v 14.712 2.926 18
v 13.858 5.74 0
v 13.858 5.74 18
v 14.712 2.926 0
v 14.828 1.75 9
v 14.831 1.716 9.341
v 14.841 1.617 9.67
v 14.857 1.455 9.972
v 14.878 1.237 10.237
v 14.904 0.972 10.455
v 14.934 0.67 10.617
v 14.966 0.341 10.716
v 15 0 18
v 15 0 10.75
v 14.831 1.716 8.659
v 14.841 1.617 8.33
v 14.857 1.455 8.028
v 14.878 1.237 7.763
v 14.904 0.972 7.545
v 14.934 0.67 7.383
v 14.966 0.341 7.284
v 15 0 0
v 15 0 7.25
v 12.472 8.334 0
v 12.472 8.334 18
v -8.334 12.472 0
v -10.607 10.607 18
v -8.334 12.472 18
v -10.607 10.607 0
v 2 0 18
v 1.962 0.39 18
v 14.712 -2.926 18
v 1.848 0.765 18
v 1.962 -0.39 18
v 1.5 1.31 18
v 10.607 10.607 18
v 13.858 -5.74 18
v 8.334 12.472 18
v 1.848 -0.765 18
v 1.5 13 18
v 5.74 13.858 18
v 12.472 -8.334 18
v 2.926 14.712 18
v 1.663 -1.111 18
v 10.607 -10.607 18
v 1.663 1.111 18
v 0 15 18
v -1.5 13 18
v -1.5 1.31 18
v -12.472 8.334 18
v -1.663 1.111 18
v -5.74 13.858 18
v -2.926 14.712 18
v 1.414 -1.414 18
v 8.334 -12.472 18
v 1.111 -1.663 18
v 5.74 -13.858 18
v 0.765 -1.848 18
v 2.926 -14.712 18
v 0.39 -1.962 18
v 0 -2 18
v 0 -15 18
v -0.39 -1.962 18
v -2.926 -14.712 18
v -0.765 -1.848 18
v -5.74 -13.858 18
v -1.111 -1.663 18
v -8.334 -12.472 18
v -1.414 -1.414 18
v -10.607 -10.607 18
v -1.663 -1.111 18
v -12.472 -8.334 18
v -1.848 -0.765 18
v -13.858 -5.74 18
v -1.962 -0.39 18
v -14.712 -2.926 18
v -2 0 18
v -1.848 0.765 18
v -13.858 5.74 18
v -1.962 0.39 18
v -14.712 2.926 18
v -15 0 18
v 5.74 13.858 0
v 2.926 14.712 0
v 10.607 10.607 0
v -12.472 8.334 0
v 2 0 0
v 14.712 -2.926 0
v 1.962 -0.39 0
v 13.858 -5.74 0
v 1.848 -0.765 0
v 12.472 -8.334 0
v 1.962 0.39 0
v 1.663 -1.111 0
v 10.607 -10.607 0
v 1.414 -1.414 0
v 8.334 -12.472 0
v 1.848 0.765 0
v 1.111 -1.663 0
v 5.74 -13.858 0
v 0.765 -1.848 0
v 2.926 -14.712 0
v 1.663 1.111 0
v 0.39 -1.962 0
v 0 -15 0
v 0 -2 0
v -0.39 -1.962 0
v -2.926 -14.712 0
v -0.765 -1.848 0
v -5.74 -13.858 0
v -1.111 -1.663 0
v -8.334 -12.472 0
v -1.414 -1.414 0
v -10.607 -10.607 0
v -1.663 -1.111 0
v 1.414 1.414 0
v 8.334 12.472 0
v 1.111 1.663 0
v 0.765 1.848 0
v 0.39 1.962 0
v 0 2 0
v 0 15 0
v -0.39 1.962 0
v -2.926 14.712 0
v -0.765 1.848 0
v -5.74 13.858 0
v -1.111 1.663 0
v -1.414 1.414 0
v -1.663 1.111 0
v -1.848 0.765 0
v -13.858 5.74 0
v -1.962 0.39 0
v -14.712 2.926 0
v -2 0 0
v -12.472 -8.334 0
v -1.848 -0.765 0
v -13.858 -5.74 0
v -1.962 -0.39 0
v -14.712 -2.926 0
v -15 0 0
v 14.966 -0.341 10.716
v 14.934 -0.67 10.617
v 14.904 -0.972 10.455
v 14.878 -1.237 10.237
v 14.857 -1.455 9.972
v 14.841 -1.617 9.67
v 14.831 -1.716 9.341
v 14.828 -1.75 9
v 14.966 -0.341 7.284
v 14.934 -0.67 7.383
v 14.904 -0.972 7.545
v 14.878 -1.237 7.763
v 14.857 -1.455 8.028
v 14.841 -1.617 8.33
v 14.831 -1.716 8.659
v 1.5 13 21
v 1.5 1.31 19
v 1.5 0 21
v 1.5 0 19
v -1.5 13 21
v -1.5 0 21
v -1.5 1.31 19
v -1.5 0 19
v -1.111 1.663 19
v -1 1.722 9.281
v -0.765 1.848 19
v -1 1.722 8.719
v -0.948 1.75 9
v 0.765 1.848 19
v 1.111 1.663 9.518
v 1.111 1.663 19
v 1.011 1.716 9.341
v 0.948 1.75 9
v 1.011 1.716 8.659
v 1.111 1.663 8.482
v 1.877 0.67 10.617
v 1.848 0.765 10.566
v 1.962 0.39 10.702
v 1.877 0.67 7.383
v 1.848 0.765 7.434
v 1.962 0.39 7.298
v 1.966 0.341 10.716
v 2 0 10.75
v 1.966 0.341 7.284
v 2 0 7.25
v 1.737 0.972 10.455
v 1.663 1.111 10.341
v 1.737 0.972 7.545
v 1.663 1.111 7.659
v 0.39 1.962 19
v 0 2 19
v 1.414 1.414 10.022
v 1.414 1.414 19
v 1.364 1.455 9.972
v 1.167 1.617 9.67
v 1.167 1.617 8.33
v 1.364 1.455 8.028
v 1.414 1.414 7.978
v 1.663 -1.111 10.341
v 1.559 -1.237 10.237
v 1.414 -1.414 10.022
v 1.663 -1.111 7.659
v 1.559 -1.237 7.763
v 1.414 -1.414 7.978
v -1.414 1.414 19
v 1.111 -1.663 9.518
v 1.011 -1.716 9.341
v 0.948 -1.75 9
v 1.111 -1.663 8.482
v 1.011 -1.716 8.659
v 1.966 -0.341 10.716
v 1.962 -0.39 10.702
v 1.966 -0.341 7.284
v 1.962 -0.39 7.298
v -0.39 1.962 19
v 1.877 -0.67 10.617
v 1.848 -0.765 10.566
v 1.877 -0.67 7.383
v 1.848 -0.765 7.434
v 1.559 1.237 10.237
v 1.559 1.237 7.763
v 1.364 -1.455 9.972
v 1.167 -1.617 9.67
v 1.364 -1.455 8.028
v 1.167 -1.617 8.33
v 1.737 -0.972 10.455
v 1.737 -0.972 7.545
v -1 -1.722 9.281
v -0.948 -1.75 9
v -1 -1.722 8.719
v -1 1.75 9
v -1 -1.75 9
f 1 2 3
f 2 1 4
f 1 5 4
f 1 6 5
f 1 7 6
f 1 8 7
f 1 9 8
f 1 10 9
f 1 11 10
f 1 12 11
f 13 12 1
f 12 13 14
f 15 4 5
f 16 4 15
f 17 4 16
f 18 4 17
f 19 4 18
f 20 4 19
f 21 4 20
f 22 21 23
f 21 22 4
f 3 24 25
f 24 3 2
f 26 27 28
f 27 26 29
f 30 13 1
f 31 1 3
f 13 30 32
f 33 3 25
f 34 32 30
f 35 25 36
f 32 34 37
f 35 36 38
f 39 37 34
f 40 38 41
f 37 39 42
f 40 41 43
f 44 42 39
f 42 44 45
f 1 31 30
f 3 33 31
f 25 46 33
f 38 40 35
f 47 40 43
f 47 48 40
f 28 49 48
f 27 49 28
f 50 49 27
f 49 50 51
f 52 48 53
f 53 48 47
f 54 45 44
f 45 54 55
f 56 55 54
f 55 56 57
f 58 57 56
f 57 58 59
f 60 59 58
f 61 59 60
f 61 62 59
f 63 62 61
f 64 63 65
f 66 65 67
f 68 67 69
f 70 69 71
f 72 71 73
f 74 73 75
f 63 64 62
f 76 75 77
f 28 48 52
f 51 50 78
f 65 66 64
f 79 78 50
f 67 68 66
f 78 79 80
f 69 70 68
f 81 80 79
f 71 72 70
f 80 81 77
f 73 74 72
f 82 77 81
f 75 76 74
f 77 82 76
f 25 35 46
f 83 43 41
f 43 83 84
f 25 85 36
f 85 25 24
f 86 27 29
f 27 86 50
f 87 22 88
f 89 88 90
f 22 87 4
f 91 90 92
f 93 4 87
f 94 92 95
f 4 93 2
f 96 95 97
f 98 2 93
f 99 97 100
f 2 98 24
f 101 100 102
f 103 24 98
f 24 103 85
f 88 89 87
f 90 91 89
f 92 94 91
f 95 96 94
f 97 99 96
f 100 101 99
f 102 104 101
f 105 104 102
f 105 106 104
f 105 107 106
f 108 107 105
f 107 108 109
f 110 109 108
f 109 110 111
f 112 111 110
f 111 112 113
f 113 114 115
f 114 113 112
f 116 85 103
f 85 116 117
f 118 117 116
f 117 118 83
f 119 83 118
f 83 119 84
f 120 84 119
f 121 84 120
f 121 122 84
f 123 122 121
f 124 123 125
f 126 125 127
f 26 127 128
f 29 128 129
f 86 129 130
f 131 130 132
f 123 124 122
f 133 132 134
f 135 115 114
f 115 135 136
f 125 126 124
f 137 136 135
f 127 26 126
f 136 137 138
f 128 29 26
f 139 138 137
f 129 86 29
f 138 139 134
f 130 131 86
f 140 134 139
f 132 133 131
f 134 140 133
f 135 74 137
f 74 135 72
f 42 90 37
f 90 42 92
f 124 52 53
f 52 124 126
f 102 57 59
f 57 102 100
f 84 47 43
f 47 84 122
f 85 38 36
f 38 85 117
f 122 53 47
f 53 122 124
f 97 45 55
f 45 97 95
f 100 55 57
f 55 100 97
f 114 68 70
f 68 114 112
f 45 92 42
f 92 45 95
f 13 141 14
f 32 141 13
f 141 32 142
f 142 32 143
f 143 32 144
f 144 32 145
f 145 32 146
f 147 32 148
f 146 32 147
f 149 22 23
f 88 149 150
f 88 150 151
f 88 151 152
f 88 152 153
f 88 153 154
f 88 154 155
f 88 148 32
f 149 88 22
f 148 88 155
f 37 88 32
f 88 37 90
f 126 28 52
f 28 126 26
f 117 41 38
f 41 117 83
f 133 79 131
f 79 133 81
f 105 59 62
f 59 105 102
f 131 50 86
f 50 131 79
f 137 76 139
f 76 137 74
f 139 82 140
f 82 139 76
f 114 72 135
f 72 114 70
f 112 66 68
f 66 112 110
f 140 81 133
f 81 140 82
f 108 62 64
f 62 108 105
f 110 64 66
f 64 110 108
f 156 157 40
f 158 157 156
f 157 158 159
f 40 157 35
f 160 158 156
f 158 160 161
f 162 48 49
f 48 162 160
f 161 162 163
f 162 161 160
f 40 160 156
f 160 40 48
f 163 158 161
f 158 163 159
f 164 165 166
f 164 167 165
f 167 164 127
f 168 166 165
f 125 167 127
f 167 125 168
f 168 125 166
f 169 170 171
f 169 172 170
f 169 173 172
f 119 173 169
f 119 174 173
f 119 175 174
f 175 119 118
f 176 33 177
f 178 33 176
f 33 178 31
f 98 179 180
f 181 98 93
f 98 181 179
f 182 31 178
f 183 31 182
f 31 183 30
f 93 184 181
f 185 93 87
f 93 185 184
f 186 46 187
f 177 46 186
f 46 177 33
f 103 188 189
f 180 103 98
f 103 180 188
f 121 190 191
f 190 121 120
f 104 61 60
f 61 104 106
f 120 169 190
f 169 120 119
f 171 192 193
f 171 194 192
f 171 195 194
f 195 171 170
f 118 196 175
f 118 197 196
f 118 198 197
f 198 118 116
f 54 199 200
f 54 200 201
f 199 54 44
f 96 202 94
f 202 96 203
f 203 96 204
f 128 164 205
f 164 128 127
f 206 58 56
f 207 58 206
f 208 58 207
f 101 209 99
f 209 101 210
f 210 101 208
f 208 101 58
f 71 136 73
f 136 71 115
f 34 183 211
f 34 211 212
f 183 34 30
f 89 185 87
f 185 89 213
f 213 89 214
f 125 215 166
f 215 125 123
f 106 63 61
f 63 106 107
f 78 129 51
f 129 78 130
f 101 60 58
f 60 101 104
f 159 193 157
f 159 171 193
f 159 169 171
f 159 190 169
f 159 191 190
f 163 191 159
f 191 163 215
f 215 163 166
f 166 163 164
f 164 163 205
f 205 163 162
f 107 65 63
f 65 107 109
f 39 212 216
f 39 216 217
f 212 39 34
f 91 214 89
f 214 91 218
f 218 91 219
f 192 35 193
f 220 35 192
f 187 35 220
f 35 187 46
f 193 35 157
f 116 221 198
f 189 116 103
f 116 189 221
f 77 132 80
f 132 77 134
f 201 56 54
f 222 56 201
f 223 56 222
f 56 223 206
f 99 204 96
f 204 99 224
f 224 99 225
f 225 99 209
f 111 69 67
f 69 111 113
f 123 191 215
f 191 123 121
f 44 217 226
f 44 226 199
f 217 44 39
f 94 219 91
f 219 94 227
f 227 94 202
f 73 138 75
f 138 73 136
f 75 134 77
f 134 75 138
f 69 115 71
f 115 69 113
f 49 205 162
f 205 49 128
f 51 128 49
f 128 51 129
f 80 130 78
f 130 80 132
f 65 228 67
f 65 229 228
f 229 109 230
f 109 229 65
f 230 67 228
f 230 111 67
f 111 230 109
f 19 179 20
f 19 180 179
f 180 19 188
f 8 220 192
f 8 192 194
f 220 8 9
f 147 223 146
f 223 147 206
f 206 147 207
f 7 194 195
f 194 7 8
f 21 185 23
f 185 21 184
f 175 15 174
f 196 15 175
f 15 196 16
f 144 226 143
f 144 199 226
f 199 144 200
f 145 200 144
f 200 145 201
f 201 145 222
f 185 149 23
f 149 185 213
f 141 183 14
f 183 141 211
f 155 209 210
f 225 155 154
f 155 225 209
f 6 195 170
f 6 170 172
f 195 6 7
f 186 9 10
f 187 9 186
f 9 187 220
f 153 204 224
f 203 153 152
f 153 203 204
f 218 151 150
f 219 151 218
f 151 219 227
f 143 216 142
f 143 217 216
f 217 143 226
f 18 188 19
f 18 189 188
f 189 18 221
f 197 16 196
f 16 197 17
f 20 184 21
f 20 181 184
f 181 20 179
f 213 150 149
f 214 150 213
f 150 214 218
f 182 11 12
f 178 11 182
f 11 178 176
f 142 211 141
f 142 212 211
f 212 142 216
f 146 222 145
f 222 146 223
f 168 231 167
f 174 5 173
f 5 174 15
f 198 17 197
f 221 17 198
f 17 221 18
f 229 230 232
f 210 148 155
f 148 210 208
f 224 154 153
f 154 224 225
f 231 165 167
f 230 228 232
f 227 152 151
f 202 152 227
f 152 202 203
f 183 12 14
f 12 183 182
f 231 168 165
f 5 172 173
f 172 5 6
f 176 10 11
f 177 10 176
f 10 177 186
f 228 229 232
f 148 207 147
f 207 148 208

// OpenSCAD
$fn = 32;

// ----------------------------------------------------------------------
// Control knob: pointer knob
// ----------------------------------------------------------------------

// --- parameters (mm) ---
rib_w = 3;                // pointer rib width
rib_h = 4;                // pointer rib height
knob_d = 30;              // knob body diameter
knob_h = 18;              // knob body height
bore_d = 4;               // shaft bore diameter
set_d = 3.5;              // set screw bore diameter
fit_tol = 0.05;           // tolerance for press fits, mm
free_tol = 0.3;           // tolerance for clearance fits, mm

rib_poke = rib_h - 1;  // rib height above the top
total_h = knob_h + rib_h - 1;  // overall height

difference() {
  union() {
    cylinder(h = knob_h, d = knob_d);
    translate([-rib_w / 2, 0, knob_h - 1])
      cube([rib_w, knob_d / 2 - 2, rib_h]);
  }
  translate([0, 0, -1]) cylinder(h = knob_h + 2, d = bore_d);
  translate([-1, 0, knob_h / 2]) rotate([0, 90, 0])
    cylinder(h = knob_d / 2 + bore_d / 2 + 2, d = set_d);}
